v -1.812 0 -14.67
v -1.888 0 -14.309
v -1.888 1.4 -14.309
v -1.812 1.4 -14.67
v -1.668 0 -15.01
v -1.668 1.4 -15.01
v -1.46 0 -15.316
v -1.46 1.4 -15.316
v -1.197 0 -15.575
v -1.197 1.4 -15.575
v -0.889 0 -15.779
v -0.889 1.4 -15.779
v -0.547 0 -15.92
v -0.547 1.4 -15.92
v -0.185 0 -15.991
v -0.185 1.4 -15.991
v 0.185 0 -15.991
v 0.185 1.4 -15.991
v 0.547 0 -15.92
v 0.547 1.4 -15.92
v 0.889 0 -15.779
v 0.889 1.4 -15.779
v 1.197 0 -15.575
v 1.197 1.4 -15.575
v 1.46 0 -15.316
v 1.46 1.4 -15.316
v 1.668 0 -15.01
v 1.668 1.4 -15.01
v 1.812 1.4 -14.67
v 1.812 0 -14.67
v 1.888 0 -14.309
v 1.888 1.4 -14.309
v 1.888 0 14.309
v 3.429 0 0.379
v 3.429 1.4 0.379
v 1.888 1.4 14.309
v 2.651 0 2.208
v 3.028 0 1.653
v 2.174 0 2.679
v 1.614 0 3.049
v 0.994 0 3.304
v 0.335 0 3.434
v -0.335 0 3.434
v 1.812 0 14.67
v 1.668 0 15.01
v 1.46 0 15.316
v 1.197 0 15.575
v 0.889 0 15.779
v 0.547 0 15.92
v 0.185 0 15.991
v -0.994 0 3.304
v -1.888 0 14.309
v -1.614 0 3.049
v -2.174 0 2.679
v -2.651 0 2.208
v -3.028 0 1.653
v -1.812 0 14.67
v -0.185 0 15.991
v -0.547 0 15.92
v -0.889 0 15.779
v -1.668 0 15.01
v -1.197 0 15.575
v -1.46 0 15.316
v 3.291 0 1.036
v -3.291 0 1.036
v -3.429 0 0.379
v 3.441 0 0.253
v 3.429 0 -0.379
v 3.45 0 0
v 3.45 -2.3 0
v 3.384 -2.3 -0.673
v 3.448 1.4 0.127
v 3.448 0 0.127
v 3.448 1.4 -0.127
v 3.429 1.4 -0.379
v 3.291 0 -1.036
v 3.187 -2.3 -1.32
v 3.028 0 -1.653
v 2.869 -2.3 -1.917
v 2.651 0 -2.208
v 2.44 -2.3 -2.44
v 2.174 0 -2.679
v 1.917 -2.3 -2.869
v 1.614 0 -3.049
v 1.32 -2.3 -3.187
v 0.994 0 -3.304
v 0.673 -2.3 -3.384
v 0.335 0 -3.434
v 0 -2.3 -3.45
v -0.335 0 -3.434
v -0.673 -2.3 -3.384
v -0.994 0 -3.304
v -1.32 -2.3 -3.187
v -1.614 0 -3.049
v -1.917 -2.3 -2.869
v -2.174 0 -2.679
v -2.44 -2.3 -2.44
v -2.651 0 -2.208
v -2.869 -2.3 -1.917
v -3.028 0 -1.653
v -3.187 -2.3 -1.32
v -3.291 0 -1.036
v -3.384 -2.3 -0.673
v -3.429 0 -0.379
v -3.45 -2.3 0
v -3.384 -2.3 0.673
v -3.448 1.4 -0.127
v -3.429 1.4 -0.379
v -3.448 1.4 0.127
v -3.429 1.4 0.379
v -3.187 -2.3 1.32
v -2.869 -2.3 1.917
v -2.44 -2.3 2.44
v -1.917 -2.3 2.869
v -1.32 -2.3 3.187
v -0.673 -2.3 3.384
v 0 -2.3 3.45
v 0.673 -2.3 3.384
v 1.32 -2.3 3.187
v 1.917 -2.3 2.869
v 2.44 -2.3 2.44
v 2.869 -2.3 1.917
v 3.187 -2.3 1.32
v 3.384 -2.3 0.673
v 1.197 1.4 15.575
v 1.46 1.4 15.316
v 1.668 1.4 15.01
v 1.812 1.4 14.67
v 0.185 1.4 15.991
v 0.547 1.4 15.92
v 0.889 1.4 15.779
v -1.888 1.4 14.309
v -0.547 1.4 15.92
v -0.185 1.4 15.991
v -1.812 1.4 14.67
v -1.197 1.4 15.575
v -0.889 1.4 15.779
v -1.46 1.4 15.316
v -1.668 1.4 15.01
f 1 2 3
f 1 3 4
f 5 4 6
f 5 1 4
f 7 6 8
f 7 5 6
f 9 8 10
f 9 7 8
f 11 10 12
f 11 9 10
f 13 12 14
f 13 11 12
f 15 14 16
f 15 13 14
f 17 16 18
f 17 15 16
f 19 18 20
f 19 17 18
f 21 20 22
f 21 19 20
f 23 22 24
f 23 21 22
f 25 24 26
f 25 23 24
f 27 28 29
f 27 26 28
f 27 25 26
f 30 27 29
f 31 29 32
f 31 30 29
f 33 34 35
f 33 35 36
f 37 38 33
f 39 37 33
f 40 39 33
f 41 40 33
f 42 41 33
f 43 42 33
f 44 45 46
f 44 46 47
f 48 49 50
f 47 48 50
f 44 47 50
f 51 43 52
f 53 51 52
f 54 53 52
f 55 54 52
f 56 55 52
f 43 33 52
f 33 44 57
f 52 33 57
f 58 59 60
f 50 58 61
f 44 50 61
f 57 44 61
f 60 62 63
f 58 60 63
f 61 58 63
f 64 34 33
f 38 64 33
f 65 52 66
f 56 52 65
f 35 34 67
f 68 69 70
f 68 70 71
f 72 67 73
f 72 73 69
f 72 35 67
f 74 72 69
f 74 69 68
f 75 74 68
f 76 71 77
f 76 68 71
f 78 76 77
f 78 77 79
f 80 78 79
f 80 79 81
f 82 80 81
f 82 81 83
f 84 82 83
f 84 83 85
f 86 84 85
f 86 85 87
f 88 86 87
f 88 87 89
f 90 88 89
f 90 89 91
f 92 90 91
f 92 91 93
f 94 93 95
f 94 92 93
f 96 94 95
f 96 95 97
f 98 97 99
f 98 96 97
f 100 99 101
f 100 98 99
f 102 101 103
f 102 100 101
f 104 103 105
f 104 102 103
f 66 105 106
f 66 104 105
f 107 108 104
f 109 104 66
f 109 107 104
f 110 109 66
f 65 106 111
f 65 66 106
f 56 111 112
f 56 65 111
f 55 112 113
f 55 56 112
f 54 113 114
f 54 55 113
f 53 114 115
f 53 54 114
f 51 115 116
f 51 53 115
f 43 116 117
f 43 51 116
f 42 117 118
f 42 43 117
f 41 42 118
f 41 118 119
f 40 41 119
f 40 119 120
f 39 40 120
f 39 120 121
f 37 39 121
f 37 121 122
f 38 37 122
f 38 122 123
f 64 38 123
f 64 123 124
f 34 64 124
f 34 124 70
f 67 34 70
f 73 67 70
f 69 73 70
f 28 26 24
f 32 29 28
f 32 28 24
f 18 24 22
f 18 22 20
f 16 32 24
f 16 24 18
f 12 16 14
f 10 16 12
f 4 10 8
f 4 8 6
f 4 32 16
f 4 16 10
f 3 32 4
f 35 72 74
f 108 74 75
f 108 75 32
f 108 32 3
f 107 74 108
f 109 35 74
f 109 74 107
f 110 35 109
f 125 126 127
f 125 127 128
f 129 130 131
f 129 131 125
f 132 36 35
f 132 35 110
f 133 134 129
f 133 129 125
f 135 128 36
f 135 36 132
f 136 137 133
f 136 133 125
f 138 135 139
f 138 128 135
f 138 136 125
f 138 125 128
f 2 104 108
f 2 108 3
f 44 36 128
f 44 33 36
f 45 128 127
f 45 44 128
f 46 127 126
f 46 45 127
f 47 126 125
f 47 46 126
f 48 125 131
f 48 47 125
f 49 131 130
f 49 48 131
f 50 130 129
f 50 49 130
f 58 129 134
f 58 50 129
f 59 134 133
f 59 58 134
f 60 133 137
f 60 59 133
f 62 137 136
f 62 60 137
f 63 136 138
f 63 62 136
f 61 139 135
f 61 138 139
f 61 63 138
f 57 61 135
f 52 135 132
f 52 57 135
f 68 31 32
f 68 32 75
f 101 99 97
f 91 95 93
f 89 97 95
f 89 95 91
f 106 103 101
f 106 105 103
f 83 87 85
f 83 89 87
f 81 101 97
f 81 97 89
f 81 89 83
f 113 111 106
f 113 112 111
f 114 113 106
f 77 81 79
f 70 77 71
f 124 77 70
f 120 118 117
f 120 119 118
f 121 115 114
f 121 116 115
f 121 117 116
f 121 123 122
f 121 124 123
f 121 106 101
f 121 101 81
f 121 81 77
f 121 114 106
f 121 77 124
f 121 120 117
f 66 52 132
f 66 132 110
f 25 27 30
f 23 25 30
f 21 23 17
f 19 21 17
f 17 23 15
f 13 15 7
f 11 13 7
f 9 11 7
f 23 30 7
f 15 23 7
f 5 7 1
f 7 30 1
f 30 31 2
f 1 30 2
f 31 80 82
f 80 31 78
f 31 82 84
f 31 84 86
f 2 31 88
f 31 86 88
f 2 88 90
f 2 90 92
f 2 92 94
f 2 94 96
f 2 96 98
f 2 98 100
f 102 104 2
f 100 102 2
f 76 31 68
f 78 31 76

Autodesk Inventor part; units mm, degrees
ref_plane "YZ Plane" through (0, 0, 0) normal (1, 0, 0) x (0, 1, 0)
ref_plane "XZ Plane" through (0, 0, 0) normal (0, 1, 0) x (-1, 0, 0)
ref_plane "XY Plane" through (0, 0, 0) normal (0, 0, 1) x (1, 0, 0)
sketch "スケッチ1" plane through (0, 0, 0) normal (0, 1, 0) x (-1, 0, 0)
  circle A0 centre (0, 0) radius 3.45
  circle A1 centre (0, 14.1) radius 1.9
  circle A2 centre (0, -14.1) radius 1.9
  line L0 (4.83, 0) -> (-4.83, 0) projected
  line L1 (1.8885, 14.3089) -> (3.4291, 0.3793)
  line L2 (3.4291, -0.3793) -> (1.8885, -14.3089)
  line L3 (-1.8885, -14.3089) -> (-3.4291, -0.3793)
  line L4 (-3.4291, 0.3793) -> (-1.8885, 14.3089)
  dimension "d0" = 6.9
  dimension "d1" = 3.8
  dimension "d3" = 28.2
extrude "押し出し1" add sketch "スケッチ1" along normal blind 1.4
sketch "スケッチ2" plane through (0, 0, 0) normal (0, -1, 0) x (1, 0, 0)
  circle A0 centre (0, 0) radius 3.45
  arc A1 (3.4291, -0.3793) -> (-3.4291, -0.3793) centre (0, 0) ccw projected
  point P0 (3.4291, 0.3793)
extrude "押し出し2" add sketch "スケッチ2" along normal blind 2.3
properties part number "Miusei_hone_long"
